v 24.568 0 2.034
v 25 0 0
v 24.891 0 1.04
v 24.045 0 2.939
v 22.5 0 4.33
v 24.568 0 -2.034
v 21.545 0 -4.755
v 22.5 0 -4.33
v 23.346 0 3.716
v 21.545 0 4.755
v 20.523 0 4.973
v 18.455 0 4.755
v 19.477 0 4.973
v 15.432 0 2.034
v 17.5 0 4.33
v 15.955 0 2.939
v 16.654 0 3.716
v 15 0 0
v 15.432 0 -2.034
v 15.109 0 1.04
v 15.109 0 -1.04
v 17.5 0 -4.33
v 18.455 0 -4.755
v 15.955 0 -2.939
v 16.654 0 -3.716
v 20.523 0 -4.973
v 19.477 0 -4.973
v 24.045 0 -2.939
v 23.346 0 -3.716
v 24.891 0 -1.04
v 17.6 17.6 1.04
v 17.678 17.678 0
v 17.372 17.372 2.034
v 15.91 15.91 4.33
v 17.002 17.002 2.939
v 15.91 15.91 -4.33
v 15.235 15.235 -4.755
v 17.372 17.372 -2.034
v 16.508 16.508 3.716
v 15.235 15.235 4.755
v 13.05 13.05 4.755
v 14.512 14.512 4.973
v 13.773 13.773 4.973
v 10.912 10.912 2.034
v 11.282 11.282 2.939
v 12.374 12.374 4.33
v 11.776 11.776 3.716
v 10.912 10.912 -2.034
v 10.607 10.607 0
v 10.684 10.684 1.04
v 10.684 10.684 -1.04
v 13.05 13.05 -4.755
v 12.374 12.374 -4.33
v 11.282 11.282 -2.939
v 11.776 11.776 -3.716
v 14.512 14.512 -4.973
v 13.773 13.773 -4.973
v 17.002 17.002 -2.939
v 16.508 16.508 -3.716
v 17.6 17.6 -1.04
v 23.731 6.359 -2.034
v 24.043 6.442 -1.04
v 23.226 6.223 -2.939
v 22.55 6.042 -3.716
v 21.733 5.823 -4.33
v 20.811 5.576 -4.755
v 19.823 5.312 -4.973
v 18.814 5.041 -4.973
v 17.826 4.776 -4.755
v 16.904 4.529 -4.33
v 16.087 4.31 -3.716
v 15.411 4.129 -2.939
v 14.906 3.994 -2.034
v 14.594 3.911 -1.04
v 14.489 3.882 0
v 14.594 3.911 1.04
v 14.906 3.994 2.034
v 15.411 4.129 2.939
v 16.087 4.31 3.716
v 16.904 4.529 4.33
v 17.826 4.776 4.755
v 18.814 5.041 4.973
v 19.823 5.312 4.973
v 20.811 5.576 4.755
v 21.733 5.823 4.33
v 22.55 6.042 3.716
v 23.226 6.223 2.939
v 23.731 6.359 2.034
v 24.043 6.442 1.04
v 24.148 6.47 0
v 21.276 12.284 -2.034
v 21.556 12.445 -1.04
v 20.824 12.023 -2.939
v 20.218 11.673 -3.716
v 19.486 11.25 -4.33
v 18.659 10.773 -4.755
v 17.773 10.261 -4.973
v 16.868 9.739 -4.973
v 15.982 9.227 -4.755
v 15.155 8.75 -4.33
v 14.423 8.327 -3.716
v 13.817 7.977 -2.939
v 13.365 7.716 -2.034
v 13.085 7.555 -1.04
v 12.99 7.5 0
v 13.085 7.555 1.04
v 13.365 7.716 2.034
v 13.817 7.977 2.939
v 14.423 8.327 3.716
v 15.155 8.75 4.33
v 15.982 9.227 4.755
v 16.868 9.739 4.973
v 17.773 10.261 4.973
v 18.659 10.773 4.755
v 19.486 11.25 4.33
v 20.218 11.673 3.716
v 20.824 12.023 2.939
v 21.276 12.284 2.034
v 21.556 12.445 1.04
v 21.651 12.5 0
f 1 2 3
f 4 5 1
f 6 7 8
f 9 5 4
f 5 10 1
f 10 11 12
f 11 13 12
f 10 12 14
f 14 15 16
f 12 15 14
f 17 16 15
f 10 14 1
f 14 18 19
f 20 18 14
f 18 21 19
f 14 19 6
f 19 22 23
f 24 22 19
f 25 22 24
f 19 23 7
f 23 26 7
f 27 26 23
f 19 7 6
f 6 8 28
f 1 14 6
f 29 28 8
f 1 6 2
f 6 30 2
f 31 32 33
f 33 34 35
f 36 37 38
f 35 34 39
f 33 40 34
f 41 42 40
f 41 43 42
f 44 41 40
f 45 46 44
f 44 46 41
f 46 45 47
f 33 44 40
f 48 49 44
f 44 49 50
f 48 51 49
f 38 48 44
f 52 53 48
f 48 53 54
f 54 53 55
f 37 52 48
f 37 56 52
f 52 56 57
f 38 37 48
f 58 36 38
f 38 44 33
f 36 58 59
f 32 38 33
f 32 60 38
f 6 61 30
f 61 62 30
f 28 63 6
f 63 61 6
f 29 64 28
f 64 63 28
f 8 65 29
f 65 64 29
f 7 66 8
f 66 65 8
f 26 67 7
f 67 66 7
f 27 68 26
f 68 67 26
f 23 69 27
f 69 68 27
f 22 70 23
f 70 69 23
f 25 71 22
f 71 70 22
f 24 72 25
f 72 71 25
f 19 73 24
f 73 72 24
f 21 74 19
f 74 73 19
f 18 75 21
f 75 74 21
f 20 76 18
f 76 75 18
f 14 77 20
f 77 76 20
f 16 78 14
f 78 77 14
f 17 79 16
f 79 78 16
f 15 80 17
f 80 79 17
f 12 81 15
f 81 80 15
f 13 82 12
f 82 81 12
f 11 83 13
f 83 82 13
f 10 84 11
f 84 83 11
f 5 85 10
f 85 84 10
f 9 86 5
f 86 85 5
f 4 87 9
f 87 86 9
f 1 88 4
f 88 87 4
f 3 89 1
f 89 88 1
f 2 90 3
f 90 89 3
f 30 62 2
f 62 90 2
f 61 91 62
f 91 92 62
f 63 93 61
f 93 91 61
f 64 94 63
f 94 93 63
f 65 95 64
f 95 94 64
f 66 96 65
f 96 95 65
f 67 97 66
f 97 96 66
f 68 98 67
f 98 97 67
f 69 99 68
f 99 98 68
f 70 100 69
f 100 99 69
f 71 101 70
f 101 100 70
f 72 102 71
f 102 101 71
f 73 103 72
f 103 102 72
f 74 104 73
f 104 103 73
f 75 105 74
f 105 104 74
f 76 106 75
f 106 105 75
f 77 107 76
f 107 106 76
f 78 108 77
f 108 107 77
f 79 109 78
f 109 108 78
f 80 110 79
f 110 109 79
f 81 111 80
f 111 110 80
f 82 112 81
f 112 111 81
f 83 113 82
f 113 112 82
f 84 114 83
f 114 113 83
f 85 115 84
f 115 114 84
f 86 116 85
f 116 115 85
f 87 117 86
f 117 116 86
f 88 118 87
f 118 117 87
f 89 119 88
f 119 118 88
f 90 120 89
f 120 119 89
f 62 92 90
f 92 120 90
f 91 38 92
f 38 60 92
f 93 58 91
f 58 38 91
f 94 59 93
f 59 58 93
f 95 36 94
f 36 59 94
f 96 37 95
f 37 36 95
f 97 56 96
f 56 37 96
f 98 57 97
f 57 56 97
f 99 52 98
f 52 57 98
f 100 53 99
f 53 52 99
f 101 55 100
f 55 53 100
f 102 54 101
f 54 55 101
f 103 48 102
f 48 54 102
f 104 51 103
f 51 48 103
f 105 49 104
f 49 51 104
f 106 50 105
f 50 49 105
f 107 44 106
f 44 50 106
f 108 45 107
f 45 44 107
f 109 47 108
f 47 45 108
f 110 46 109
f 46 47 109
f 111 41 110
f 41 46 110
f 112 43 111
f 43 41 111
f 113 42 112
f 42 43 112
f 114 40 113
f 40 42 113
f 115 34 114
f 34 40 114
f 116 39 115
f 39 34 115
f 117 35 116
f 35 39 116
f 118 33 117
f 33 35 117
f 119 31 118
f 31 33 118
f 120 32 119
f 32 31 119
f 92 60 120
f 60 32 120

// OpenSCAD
toroid();

module toroid(r=5,R=20,angle=45){
    rotate_extrude(angle=angle)translate([R,0,0])circle(r,$fn=30);    
}
